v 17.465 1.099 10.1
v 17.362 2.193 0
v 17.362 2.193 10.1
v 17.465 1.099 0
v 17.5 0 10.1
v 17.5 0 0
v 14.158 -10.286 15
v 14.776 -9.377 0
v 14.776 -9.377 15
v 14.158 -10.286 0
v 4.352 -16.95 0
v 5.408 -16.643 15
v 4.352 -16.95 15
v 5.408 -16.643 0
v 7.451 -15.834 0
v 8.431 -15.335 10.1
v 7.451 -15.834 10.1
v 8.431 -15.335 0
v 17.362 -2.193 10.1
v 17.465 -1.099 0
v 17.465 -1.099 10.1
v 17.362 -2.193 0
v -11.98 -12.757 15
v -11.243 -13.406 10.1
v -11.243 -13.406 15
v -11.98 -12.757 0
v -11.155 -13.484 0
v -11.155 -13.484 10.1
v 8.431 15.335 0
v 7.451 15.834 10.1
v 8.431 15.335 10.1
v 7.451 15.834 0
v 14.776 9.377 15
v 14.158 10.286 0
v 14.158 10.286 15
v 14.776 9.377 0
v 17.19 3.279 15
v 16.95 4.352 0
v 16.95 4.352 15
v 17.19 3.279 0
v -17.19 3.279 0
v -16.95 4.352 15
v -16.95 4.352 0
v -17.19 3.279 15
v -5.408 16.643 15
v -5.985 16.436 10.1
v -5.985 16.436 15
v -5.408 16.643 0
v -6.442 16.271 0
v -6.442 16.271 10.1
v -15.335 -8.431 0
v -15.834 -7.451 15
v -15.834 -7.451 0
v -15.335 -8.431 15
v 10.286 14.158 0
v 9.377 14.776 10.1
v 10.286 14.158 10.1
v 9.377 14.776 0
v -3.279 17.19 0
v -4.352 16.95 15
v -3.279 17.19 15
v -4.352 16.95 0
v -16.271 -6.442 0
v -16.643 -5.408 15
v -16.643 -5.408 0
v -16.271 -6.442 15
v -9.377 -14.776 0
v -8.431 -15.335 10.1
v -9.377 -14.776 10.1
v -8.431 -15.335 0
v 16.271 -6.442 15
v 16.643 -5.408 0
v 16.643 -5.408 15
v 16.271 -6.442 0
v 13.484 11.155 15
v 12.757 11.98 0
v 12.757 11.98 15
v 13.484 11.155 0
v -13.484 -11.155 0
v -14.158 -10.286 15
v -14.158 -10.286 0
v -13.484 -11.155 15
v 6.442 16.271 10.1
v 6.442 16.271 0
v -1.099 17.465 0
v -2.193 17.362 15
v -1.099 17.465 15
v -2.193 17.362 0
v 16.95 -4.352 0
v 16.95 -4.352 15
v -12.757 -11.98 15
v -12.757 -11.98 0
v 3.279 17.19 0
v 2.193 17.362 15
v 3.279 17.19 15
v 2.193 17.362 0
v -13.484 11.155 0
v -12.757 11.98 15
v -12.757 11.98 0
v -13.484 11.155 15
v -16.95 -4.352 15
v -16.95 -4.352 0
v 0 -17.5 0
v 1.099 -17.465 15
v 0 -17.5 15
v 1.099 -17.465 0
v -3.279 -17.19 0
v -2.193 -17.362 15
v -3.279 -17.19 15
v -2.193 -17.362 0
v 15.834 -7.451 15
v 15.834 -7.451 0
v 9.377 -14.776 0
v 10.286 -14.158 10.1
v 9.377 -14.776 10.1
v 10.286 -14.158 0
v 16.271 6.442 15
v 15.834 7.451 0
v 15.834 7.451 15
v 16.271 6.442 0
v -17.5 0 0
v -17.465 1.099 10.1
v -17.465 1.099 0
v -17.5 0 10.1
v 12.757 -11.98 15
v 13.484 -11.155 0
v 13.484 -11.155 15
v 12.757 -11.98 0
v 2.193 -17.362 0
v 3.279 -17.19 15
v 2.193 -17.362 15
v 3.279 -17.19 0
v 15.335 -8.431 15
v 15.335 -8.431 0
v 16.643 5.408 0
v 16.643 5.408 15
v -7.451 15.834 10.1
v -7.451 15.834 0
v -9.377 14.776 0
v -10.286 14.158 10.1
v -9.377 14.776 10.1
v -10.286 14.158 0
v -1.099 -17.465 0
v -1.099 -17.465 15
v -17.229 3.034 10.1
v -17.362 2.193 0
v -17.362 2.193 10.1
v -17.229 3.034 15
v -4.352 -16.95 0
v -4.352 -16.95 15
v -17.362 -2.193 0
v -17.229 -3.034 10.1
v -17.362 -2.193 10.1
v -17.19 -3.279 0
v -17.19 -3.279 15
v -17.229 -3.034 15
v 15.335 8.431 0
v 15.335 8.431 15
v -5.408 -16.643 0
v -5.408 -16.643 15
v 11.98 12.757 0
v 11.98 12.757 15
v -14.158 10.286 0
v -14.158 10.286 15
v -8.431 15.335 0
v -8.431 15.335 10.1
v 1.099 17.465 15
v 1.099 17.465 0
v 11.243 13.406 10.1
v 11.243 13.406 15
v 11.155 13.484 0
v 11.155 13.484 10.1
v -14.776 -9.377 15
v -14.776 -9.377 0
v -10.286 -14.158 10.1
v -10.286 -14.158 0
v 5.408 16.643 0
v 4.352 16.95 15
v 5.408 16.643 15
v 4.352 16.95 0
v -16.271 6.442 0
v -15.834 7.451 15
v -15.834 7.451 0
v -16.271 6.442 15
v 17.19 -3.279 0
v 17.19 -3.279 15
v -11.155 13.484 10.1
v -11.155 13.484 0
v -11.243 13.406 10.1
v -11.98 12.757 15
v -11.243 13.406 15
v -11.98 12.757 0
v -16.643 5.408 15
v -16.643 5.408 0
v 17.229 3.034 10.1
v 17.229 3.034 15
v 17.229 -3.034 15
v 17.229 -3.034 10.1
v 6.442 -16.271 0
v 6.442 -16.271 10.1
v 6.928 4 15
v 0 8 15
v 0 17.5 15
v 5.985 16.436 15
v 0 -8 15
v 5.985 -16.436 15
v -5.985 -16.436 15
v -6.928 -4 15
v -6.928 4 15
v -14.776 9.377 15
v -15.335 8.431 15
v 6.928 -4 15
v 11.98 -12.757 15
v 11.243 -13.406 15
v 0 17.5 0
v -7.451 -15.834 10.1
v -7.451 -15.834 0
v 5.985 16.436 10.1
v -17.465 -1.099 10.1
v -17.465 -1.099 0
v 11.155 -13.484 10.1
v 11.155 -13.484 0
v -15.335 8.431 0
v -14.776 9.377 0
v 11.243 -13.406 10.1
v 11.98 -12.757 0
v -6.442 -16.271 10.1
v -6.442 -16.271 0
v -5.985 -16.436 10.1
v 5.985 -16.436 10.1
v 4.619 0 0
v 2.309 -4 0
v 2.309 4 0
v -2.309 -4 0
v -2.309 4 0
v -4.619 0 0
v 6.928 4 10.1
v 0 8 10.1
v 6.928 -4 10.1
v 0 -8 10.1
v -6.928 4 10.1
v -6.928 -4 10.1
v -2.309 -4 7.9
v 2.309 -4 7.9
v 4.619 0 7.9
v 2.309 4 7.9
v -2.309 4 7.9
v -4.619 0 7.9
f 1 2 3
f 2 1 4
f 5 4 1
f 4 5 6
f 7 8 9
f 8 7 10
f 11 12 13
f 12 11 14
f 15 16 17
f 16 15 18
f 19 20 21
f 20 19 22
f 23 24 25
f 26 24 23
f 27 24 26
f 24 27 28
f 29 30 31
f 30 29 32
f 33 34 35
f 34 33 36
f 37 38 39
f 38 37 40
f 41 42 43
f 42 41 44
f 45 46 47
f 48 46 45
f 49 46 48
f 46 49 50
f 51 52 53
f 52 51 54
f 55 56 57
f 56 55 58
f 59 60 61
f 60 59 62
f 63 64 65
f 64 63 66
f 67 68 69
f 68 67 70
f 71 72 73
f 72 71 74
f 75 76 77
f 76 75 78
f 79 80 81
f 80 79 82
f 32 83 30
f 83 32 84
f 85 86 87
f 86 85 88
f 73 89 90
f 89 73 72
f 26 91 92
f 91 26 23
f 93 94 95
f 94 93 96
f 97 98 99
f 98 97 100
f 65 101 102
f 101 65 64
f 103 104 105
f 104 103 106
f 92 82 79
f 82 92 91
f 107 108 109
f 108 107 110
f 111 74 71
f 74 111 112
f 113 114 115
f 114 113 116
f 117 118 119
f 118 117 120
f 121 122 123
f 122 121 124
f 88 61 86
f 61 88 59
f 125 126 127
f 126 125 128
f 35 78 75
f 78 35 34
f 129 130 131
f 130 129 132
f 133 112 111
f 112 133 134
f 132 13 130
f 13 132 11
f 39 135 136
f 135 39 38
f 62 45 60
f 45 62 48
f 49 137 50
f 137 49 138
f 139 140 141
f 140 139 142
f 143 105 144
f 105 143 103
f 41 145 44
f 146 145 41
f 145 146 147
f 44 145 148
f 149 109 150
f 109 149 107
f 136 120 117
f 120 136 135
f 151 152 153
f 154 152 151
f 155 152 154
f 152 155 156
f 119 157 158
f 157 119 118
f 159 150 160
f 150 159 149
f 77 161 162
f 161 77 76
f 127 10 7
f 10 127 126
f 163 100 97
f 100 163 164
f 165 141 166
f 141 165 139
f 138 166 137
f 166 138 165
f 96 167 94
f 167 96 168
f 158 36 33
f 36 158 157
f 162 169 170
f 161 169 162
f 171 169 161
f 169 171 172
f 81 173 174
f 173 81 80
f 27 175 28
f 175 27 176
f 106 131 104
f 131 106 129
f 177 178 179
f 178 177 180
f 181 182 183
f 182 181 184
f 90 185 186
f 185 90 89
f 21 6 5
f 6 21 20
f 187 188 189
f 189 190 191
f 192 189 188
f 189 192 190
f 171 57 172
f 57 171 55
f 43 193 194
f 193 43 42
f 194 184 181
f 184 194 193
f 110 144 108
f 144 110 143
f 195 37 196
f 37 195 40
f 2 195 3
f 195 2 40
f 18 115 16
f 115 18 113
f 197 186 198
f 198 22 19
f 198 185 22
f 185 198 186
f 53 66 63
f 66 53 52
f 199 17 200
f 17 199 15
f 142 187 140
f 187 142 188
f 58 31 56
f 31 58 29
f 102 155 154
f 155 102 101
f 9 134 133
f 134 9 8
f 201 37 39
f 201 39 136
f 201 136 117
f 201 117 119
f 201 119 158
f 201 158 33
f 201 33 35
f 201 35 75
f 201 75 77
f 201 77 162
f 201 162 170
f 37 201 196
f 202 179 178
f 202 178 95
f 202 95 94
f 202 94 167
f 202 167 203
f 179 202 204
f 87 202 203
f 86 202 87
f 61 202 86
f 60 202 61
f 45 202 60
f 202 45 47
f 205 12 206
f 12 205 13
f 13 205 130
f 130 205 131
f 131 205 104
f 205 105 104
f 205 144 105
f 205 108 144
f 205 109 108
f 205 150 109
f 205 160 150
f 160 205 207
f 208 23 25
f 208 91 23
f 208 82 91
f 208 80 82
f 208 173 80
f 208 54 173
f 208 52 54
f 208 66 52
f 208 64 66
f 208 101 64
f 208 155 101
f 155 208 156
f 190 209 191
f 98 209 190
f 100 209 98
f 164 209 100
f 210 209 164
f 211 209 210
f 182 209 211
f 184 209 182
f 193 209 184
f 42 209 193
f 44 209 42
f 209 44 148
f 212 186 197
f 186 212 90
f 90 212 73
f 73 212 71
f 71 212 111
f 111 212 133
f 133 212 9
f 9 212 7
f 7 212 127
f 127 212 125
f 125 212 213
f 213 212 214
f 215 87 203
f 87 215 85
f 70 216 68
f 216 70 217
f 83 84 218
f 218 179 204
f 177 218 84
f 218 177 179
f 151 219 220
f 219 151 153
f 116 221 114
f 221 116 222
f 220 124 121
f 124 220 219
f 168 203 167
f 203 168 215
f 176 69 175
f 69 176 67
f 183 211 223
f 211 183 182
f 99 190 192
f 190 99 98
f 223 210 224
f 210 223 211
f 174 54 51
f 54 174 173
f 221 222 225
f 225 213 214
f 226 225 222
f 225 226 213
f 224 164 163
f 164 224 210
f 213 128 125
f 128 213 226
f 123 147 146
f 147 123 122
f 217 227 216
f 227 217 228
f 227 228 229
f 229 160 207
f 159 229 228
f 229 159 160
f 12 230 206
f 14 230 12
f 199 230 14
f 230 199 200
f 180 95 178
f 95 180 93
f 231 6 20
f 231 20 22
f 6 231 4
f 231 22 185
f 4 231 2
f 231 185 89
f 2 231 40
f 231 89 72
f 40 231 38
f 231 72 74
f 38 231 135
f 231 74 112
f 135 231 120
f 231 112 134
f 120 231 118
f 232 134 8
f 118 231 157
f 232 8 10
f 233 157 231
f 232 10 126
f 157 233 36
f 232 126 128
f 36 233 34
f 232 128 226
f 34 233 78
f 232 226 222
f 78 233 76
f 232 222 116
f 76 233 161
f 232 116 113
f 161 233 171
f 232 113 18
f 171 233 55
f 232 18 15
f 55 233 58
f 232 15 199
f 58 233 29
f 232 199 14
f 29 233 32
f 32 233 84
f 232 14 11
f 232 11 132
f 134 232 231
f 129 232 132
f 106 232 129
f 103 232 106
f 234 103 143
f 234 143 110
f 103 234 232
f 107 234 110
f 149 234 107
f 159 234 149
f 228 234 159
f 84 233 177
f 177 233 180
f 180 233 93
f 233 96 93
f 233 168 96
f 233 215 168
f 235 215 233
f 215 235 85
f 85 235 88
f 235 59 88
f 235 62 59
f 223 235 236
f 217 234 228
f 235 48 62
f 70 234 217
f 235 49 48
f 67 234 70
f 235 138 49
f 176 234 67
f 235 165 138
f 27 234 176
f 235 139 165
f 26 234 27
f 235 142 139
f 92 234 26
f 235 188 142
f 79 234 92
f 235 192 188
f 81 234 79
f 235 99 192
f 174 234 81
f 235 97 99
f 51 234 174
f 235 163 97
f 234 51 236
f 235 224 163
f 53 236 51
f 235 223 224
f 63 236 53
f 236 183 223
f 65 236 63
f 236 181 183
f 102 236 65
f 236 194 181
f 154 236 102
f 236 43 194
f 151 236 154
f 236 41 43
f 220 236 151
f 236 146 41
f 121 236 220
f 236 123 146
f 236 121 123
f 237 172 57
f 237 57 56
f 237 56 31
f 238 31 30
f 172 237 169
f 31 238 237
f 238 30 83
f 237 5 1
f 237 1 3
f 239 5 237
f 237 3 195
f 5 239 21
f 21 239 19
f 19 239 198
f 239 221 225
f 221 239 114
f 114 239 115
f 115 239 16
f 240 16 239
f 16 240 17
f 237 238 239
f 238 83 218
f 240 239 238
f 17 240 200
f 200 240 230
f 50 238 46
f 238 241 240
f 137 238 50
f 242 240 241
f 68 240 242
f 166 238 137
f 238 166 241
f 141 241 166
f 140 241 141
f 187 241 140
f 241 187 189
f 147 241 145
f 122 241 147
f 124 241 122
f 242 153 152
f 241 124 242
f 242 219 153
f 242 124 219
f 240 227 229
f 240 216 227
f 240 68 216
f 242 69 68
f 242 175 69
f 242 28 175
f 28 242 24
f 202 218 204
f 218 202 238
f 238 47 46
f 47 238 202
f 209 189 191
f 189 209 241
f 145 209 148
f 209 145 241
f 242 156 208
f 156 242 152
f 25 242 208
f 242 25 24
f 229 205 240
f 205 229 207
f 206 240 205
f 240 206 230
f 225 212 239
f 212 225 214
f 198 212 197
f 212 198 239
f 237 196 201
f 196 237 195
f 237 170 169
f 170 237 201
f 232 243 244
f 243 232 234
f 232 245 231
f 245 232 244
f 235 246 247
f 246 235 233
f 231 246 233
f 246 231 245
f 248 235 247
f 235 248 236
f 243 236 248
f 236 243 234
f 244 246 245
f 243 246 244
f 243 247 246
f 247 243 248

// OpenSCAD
// points = number of points (minimum 3)
// outer  = radius to outer points
// inner  = radius to inner points
module Star(points, outer, inner) {
	
	// polar to cartesian: radius/angle to x/y
	function x(r, a) = r * cos(a);
	function y(r, a) = r * sin(a);
	
	// angular width of each pie slice of the star
	increment = 360/points;
	
	union() {
		for (p = [0 : points-1]) {
			
			// outer is outer point p
			// inner is inner point following p
			// next is next outer point following p

			assign(	x_outer = x(outer, increment * p),
					y_outer = y(outer, increment * p),
					x_inner = x(inner, (increment * p) + (increment/2)),
					y_inner = y(inner, (increment * p) + (increment/2)),
					x_next  = x(outer, increment * (p+1)),
					y_next  = y(outer, increment * (p+1))) {
				polygon(points = [[x_outer, y_outer], [x_inner, y_inner], [x_next, y_next], [0, 0]], paths  = [[0, 1, 2, 3]]);
			}
		}
	}
}


gear_inner_fi = 16;
gear_outer_fi = 35;
gear_h = 15;
gear_groove_h = 5;
gear_star_radius = 3.1 * 32;

screw_h = 8;
sqrt3 = 1.732;
groove_h = 8;

difference() {
    difference() {
        cylinder(gear_h, gear_outer_fi/2, gear_outer_fi/2, $fn=100);

        translate([0, 0, gear_h-gear_groove_h + 0.1]) linear_extrude(height=gear_groove_h) {
            Star(6, gear_star_radius/2, gear_inner_fi/2);
        }
    }


    translate([0, 0, -0.1]) cylinder (groove_h, screw_h/sqrt3, screw_h/sqrt3, $fn=6);
}
